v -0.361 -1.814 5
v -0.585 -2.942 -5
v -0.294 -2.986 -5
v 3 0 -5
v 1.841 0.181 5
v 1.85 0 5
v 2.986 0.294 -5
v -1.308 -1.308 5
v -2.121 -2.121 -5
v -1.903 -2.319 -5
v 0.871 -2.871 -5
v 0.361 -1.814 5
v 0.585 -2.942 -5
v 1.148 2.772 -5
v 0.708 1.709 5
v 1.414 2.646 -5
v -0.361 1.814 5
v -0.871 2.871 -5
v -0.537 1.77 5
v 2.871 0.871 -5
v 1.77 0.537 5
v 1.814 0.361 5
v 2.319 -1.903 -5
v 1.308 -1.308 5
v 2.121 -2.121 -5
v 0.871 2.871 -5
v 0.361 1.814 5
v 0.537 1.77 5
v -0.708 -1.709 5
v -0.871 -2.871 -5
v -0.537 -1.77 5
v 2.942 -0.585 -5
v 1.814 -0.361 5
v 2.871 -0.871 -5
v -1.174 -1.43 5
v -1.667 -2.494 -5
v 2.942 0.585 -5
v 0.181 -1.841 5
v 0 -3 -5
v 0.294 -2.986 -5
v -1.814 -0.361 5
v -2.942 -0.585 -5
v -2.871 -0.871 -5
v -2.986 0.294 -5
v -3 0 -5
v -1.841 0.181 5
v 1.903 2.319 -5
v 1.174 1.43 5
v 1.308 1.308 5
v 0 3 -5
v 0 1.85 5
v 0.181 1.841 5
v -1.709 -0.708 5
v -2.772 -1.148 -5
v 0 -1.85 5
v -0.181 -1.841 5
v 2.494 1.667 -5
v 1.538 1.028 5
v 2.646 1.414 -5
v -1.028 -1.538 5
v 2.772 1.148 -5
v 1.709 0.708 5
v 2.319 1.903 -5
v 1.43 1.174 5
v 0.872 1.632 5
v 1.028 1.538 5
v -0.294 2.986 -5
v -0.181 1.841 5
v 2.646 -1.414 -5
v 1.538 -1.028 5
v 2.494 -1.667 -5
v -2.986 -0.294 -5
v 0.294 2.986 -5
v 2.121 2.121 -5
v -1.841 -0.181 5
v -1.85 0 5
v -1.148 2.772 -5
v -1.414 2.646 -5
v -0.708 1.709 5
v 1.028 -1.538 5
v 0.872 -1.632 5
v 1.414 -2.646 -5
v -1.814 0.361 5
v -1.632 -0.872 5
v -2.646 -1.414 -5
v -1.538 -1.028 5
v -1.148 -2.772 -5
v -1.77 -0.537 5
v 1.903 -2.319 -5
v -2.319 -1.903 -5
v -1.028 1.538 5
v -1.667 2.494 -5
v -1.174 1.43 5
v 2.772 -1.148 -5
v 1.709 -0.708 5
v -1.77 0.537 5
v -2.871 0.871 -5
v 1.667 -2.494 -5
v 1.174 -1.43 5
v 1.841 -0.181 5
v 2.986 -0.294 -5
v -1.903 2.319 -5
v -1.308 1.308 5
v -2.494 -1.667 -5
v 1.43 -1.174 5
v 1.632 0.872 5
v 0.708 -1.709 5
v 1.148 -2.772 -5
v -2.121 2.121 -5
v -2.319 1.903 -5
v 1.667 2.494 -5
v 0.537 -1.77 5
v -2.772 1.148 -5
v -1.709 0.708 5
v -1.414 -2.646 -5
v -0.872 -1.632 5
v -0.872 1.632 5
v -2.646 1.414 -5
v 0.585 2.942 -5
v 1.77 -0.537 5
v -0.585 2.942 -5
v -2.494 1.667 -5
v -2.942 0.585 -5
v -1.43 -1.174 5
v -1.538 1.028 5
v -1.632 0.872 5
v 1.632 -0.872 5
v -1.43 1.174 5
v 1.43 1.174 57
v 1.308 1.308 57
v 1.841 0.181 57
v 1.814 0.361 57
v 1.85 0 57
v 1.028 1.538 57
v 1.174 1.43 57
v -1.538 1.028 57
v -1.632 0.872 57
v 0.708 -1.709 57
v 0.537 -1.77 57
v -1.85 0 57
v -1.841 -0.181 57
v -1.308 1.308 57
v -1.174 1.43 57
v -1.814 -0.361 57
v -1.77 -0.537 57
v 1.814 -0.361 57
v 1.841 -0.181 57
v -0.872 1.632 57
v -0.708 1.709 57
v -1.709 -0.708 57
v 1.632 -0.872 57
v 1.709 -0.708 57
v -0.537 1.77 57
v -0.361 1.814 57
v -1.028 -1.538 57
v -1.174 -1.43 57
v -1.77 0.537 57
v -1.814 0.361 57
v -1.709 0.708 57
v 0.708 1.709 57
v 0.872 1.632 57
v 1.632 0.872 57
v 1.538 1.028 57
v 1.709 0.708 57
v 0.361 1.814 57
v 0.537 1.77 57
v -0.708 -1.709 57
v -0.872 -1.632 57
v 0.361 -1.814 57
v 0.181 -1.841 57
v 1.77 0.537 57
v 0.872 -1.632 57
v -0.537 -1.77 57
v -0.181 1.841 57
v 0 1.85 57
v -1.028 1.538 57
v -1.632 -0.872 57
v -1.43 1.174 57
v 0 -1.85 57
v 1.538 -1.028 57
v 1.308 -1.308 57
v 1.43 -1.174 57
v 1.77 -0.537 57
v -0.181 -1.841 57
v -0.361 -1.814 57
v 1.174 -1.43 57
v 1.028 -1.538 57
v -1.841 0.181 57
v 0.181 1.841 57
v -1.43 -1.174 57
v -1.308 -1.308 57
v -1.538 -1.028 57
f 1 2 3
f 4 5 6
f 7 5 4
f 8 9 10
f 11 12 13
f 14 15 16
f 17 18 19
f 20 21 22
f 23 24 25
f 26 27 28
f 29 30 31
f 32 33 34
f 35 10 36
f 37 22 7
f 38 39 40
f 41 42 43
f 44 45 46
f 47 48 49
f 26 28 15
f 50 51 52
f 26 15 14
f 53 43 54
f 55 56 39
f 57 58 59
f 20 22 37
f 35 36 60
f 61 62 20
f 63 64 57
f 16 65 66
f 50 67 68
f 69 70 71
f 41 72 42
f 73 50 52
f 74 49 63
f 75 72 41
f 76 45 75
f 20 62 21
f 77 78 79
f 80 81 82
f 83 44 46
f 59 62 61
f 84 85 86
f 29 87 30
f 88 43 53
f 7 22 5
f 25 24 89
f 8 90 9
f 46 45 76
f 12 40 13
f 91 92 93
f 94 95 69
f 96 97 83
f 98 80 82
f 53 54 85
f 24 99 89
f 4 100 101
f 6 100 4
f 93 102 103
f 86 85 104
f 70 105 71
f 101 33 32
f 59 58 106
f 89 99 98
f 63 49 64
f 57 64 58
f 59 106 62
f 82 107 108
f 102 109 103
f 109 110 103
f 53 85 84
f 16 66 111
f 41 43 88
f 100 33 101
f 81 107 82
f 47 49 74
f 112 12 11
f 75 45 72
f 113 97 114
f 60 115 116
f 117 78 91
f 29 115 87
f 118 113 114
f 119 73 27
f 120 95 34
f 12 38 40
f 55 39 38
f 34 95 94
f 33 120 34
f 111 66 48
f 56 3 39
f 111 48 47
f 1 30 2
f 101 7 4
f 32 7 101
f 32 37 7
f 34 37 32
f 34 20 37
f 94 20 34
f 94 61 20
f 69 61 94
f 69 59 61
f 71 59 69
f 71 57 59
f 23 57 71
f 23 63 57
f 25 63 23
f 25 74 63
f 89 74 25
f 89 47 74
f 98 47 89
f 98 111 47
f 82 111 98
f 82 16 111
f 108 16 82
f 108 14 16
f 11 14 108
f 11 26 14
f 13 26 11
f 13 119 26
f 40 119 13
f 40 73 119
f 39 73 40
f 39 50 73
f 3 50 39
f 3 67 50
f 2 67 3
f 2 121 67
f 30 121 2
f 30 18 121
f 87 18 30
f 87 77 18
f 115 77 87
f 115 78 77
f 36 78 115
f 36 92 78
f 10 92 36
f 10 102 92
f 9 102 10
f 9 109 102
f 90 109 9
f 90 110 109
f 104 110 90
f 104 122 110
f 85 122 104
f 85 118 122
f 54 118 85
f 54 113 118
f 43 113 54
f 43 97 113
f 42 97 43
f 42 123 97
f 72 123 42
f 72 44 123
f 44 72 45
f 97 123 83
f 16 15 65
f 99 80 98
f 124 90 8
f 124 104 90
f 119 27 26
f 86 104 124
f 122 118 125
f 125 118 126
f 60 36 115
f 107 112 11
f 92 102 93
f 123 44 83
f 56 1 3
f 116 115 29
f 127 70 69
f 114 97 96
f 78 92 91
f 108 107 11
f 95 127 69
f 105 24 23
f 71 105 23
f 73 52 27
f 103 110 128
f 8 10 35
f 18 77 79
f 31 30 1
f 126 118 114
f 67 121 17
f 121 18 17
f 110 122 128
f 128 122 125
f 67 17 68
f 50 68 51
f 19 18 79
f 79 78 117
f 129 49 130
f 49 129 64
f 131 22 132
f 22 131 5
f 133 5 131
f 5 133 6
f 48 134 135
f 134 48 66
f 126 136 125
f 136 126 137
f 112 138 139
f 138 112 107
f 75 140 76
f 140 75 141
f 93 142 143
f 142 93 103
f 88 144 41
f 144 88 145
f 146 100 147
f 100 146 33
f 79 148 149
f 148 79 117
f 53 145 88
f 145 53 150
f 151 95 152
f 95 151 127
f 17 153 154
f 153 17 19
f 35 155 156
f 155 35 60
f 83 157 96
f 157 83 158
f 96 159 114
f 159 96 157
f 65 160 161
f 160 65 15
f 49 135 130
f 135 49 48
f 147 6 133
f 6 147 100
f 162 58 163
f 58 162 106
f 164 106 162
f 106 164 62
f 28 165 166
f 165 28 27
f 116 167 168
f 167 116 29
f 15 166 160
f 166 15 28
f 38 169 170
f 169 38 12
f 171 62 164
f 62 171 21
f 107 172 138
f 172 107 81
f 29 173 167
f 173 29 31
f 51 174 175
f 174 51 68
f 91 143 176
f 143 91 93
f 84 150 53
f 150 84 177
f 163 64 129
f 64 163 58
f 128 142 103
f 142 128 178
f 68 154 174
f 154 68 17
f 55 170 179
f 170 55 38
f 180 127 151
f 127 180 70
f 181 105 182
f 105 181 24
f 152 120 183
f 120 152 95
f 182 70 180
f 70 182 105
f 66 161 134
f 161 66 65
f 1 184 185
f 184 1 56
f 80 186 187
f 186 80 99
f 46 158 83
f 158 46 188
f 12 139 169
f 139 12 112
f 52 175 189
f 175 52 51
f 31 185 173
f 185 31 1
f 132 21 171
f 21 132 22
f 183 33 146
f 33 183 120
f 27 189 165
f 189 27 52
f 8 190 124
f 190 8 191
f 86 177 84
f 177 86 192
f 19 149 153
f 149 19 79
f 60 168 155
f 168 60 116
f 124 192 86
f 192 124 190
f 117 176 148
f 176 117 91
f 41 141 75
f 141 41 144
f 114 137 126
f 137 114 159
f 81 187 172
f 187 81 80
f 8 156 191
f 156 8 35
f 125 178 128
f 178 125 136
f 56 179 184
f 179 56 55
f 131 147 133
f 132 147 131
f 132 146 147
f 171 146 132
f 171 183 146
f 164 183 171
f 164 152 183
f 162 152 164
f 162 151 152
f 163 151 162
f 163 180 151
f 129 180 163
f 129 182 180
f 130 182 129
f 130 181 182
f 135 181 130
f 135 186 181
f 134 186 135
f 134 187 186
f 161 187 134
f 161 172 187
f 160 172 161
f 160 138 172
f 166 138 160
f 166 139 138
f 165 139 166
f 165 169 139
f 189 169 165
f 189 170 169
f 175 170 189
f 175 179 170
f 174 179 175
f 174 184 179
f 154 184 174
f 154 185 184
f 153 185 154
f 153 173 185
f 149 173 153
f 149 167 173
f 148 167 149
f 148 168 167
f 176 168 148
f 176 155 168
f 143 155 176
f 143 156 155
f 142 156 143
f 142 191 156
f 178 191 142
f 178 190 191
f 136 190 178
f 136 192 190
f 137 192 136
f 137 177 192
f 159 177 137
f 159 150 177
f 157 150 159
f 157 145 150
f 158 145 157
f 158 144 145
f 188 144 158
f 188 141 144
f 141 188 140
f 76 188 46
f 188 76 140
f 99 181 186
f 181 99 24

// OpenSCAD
module hot_end() {
    union() {
        // Nozzle
        translate([0, 0, -5])
            cylinder(h=10, d1=6, d2=3.7, $fn=64);
        
        // Barrel
        translate([0, 0, 5])
            cylinder(h=52, d=3.7, $fn=64);
        
        // Filament path
        translate([0, 0, -5])
            cylinder(h=62, d=1.75, $fn=64);
    }
}

hot_end();
